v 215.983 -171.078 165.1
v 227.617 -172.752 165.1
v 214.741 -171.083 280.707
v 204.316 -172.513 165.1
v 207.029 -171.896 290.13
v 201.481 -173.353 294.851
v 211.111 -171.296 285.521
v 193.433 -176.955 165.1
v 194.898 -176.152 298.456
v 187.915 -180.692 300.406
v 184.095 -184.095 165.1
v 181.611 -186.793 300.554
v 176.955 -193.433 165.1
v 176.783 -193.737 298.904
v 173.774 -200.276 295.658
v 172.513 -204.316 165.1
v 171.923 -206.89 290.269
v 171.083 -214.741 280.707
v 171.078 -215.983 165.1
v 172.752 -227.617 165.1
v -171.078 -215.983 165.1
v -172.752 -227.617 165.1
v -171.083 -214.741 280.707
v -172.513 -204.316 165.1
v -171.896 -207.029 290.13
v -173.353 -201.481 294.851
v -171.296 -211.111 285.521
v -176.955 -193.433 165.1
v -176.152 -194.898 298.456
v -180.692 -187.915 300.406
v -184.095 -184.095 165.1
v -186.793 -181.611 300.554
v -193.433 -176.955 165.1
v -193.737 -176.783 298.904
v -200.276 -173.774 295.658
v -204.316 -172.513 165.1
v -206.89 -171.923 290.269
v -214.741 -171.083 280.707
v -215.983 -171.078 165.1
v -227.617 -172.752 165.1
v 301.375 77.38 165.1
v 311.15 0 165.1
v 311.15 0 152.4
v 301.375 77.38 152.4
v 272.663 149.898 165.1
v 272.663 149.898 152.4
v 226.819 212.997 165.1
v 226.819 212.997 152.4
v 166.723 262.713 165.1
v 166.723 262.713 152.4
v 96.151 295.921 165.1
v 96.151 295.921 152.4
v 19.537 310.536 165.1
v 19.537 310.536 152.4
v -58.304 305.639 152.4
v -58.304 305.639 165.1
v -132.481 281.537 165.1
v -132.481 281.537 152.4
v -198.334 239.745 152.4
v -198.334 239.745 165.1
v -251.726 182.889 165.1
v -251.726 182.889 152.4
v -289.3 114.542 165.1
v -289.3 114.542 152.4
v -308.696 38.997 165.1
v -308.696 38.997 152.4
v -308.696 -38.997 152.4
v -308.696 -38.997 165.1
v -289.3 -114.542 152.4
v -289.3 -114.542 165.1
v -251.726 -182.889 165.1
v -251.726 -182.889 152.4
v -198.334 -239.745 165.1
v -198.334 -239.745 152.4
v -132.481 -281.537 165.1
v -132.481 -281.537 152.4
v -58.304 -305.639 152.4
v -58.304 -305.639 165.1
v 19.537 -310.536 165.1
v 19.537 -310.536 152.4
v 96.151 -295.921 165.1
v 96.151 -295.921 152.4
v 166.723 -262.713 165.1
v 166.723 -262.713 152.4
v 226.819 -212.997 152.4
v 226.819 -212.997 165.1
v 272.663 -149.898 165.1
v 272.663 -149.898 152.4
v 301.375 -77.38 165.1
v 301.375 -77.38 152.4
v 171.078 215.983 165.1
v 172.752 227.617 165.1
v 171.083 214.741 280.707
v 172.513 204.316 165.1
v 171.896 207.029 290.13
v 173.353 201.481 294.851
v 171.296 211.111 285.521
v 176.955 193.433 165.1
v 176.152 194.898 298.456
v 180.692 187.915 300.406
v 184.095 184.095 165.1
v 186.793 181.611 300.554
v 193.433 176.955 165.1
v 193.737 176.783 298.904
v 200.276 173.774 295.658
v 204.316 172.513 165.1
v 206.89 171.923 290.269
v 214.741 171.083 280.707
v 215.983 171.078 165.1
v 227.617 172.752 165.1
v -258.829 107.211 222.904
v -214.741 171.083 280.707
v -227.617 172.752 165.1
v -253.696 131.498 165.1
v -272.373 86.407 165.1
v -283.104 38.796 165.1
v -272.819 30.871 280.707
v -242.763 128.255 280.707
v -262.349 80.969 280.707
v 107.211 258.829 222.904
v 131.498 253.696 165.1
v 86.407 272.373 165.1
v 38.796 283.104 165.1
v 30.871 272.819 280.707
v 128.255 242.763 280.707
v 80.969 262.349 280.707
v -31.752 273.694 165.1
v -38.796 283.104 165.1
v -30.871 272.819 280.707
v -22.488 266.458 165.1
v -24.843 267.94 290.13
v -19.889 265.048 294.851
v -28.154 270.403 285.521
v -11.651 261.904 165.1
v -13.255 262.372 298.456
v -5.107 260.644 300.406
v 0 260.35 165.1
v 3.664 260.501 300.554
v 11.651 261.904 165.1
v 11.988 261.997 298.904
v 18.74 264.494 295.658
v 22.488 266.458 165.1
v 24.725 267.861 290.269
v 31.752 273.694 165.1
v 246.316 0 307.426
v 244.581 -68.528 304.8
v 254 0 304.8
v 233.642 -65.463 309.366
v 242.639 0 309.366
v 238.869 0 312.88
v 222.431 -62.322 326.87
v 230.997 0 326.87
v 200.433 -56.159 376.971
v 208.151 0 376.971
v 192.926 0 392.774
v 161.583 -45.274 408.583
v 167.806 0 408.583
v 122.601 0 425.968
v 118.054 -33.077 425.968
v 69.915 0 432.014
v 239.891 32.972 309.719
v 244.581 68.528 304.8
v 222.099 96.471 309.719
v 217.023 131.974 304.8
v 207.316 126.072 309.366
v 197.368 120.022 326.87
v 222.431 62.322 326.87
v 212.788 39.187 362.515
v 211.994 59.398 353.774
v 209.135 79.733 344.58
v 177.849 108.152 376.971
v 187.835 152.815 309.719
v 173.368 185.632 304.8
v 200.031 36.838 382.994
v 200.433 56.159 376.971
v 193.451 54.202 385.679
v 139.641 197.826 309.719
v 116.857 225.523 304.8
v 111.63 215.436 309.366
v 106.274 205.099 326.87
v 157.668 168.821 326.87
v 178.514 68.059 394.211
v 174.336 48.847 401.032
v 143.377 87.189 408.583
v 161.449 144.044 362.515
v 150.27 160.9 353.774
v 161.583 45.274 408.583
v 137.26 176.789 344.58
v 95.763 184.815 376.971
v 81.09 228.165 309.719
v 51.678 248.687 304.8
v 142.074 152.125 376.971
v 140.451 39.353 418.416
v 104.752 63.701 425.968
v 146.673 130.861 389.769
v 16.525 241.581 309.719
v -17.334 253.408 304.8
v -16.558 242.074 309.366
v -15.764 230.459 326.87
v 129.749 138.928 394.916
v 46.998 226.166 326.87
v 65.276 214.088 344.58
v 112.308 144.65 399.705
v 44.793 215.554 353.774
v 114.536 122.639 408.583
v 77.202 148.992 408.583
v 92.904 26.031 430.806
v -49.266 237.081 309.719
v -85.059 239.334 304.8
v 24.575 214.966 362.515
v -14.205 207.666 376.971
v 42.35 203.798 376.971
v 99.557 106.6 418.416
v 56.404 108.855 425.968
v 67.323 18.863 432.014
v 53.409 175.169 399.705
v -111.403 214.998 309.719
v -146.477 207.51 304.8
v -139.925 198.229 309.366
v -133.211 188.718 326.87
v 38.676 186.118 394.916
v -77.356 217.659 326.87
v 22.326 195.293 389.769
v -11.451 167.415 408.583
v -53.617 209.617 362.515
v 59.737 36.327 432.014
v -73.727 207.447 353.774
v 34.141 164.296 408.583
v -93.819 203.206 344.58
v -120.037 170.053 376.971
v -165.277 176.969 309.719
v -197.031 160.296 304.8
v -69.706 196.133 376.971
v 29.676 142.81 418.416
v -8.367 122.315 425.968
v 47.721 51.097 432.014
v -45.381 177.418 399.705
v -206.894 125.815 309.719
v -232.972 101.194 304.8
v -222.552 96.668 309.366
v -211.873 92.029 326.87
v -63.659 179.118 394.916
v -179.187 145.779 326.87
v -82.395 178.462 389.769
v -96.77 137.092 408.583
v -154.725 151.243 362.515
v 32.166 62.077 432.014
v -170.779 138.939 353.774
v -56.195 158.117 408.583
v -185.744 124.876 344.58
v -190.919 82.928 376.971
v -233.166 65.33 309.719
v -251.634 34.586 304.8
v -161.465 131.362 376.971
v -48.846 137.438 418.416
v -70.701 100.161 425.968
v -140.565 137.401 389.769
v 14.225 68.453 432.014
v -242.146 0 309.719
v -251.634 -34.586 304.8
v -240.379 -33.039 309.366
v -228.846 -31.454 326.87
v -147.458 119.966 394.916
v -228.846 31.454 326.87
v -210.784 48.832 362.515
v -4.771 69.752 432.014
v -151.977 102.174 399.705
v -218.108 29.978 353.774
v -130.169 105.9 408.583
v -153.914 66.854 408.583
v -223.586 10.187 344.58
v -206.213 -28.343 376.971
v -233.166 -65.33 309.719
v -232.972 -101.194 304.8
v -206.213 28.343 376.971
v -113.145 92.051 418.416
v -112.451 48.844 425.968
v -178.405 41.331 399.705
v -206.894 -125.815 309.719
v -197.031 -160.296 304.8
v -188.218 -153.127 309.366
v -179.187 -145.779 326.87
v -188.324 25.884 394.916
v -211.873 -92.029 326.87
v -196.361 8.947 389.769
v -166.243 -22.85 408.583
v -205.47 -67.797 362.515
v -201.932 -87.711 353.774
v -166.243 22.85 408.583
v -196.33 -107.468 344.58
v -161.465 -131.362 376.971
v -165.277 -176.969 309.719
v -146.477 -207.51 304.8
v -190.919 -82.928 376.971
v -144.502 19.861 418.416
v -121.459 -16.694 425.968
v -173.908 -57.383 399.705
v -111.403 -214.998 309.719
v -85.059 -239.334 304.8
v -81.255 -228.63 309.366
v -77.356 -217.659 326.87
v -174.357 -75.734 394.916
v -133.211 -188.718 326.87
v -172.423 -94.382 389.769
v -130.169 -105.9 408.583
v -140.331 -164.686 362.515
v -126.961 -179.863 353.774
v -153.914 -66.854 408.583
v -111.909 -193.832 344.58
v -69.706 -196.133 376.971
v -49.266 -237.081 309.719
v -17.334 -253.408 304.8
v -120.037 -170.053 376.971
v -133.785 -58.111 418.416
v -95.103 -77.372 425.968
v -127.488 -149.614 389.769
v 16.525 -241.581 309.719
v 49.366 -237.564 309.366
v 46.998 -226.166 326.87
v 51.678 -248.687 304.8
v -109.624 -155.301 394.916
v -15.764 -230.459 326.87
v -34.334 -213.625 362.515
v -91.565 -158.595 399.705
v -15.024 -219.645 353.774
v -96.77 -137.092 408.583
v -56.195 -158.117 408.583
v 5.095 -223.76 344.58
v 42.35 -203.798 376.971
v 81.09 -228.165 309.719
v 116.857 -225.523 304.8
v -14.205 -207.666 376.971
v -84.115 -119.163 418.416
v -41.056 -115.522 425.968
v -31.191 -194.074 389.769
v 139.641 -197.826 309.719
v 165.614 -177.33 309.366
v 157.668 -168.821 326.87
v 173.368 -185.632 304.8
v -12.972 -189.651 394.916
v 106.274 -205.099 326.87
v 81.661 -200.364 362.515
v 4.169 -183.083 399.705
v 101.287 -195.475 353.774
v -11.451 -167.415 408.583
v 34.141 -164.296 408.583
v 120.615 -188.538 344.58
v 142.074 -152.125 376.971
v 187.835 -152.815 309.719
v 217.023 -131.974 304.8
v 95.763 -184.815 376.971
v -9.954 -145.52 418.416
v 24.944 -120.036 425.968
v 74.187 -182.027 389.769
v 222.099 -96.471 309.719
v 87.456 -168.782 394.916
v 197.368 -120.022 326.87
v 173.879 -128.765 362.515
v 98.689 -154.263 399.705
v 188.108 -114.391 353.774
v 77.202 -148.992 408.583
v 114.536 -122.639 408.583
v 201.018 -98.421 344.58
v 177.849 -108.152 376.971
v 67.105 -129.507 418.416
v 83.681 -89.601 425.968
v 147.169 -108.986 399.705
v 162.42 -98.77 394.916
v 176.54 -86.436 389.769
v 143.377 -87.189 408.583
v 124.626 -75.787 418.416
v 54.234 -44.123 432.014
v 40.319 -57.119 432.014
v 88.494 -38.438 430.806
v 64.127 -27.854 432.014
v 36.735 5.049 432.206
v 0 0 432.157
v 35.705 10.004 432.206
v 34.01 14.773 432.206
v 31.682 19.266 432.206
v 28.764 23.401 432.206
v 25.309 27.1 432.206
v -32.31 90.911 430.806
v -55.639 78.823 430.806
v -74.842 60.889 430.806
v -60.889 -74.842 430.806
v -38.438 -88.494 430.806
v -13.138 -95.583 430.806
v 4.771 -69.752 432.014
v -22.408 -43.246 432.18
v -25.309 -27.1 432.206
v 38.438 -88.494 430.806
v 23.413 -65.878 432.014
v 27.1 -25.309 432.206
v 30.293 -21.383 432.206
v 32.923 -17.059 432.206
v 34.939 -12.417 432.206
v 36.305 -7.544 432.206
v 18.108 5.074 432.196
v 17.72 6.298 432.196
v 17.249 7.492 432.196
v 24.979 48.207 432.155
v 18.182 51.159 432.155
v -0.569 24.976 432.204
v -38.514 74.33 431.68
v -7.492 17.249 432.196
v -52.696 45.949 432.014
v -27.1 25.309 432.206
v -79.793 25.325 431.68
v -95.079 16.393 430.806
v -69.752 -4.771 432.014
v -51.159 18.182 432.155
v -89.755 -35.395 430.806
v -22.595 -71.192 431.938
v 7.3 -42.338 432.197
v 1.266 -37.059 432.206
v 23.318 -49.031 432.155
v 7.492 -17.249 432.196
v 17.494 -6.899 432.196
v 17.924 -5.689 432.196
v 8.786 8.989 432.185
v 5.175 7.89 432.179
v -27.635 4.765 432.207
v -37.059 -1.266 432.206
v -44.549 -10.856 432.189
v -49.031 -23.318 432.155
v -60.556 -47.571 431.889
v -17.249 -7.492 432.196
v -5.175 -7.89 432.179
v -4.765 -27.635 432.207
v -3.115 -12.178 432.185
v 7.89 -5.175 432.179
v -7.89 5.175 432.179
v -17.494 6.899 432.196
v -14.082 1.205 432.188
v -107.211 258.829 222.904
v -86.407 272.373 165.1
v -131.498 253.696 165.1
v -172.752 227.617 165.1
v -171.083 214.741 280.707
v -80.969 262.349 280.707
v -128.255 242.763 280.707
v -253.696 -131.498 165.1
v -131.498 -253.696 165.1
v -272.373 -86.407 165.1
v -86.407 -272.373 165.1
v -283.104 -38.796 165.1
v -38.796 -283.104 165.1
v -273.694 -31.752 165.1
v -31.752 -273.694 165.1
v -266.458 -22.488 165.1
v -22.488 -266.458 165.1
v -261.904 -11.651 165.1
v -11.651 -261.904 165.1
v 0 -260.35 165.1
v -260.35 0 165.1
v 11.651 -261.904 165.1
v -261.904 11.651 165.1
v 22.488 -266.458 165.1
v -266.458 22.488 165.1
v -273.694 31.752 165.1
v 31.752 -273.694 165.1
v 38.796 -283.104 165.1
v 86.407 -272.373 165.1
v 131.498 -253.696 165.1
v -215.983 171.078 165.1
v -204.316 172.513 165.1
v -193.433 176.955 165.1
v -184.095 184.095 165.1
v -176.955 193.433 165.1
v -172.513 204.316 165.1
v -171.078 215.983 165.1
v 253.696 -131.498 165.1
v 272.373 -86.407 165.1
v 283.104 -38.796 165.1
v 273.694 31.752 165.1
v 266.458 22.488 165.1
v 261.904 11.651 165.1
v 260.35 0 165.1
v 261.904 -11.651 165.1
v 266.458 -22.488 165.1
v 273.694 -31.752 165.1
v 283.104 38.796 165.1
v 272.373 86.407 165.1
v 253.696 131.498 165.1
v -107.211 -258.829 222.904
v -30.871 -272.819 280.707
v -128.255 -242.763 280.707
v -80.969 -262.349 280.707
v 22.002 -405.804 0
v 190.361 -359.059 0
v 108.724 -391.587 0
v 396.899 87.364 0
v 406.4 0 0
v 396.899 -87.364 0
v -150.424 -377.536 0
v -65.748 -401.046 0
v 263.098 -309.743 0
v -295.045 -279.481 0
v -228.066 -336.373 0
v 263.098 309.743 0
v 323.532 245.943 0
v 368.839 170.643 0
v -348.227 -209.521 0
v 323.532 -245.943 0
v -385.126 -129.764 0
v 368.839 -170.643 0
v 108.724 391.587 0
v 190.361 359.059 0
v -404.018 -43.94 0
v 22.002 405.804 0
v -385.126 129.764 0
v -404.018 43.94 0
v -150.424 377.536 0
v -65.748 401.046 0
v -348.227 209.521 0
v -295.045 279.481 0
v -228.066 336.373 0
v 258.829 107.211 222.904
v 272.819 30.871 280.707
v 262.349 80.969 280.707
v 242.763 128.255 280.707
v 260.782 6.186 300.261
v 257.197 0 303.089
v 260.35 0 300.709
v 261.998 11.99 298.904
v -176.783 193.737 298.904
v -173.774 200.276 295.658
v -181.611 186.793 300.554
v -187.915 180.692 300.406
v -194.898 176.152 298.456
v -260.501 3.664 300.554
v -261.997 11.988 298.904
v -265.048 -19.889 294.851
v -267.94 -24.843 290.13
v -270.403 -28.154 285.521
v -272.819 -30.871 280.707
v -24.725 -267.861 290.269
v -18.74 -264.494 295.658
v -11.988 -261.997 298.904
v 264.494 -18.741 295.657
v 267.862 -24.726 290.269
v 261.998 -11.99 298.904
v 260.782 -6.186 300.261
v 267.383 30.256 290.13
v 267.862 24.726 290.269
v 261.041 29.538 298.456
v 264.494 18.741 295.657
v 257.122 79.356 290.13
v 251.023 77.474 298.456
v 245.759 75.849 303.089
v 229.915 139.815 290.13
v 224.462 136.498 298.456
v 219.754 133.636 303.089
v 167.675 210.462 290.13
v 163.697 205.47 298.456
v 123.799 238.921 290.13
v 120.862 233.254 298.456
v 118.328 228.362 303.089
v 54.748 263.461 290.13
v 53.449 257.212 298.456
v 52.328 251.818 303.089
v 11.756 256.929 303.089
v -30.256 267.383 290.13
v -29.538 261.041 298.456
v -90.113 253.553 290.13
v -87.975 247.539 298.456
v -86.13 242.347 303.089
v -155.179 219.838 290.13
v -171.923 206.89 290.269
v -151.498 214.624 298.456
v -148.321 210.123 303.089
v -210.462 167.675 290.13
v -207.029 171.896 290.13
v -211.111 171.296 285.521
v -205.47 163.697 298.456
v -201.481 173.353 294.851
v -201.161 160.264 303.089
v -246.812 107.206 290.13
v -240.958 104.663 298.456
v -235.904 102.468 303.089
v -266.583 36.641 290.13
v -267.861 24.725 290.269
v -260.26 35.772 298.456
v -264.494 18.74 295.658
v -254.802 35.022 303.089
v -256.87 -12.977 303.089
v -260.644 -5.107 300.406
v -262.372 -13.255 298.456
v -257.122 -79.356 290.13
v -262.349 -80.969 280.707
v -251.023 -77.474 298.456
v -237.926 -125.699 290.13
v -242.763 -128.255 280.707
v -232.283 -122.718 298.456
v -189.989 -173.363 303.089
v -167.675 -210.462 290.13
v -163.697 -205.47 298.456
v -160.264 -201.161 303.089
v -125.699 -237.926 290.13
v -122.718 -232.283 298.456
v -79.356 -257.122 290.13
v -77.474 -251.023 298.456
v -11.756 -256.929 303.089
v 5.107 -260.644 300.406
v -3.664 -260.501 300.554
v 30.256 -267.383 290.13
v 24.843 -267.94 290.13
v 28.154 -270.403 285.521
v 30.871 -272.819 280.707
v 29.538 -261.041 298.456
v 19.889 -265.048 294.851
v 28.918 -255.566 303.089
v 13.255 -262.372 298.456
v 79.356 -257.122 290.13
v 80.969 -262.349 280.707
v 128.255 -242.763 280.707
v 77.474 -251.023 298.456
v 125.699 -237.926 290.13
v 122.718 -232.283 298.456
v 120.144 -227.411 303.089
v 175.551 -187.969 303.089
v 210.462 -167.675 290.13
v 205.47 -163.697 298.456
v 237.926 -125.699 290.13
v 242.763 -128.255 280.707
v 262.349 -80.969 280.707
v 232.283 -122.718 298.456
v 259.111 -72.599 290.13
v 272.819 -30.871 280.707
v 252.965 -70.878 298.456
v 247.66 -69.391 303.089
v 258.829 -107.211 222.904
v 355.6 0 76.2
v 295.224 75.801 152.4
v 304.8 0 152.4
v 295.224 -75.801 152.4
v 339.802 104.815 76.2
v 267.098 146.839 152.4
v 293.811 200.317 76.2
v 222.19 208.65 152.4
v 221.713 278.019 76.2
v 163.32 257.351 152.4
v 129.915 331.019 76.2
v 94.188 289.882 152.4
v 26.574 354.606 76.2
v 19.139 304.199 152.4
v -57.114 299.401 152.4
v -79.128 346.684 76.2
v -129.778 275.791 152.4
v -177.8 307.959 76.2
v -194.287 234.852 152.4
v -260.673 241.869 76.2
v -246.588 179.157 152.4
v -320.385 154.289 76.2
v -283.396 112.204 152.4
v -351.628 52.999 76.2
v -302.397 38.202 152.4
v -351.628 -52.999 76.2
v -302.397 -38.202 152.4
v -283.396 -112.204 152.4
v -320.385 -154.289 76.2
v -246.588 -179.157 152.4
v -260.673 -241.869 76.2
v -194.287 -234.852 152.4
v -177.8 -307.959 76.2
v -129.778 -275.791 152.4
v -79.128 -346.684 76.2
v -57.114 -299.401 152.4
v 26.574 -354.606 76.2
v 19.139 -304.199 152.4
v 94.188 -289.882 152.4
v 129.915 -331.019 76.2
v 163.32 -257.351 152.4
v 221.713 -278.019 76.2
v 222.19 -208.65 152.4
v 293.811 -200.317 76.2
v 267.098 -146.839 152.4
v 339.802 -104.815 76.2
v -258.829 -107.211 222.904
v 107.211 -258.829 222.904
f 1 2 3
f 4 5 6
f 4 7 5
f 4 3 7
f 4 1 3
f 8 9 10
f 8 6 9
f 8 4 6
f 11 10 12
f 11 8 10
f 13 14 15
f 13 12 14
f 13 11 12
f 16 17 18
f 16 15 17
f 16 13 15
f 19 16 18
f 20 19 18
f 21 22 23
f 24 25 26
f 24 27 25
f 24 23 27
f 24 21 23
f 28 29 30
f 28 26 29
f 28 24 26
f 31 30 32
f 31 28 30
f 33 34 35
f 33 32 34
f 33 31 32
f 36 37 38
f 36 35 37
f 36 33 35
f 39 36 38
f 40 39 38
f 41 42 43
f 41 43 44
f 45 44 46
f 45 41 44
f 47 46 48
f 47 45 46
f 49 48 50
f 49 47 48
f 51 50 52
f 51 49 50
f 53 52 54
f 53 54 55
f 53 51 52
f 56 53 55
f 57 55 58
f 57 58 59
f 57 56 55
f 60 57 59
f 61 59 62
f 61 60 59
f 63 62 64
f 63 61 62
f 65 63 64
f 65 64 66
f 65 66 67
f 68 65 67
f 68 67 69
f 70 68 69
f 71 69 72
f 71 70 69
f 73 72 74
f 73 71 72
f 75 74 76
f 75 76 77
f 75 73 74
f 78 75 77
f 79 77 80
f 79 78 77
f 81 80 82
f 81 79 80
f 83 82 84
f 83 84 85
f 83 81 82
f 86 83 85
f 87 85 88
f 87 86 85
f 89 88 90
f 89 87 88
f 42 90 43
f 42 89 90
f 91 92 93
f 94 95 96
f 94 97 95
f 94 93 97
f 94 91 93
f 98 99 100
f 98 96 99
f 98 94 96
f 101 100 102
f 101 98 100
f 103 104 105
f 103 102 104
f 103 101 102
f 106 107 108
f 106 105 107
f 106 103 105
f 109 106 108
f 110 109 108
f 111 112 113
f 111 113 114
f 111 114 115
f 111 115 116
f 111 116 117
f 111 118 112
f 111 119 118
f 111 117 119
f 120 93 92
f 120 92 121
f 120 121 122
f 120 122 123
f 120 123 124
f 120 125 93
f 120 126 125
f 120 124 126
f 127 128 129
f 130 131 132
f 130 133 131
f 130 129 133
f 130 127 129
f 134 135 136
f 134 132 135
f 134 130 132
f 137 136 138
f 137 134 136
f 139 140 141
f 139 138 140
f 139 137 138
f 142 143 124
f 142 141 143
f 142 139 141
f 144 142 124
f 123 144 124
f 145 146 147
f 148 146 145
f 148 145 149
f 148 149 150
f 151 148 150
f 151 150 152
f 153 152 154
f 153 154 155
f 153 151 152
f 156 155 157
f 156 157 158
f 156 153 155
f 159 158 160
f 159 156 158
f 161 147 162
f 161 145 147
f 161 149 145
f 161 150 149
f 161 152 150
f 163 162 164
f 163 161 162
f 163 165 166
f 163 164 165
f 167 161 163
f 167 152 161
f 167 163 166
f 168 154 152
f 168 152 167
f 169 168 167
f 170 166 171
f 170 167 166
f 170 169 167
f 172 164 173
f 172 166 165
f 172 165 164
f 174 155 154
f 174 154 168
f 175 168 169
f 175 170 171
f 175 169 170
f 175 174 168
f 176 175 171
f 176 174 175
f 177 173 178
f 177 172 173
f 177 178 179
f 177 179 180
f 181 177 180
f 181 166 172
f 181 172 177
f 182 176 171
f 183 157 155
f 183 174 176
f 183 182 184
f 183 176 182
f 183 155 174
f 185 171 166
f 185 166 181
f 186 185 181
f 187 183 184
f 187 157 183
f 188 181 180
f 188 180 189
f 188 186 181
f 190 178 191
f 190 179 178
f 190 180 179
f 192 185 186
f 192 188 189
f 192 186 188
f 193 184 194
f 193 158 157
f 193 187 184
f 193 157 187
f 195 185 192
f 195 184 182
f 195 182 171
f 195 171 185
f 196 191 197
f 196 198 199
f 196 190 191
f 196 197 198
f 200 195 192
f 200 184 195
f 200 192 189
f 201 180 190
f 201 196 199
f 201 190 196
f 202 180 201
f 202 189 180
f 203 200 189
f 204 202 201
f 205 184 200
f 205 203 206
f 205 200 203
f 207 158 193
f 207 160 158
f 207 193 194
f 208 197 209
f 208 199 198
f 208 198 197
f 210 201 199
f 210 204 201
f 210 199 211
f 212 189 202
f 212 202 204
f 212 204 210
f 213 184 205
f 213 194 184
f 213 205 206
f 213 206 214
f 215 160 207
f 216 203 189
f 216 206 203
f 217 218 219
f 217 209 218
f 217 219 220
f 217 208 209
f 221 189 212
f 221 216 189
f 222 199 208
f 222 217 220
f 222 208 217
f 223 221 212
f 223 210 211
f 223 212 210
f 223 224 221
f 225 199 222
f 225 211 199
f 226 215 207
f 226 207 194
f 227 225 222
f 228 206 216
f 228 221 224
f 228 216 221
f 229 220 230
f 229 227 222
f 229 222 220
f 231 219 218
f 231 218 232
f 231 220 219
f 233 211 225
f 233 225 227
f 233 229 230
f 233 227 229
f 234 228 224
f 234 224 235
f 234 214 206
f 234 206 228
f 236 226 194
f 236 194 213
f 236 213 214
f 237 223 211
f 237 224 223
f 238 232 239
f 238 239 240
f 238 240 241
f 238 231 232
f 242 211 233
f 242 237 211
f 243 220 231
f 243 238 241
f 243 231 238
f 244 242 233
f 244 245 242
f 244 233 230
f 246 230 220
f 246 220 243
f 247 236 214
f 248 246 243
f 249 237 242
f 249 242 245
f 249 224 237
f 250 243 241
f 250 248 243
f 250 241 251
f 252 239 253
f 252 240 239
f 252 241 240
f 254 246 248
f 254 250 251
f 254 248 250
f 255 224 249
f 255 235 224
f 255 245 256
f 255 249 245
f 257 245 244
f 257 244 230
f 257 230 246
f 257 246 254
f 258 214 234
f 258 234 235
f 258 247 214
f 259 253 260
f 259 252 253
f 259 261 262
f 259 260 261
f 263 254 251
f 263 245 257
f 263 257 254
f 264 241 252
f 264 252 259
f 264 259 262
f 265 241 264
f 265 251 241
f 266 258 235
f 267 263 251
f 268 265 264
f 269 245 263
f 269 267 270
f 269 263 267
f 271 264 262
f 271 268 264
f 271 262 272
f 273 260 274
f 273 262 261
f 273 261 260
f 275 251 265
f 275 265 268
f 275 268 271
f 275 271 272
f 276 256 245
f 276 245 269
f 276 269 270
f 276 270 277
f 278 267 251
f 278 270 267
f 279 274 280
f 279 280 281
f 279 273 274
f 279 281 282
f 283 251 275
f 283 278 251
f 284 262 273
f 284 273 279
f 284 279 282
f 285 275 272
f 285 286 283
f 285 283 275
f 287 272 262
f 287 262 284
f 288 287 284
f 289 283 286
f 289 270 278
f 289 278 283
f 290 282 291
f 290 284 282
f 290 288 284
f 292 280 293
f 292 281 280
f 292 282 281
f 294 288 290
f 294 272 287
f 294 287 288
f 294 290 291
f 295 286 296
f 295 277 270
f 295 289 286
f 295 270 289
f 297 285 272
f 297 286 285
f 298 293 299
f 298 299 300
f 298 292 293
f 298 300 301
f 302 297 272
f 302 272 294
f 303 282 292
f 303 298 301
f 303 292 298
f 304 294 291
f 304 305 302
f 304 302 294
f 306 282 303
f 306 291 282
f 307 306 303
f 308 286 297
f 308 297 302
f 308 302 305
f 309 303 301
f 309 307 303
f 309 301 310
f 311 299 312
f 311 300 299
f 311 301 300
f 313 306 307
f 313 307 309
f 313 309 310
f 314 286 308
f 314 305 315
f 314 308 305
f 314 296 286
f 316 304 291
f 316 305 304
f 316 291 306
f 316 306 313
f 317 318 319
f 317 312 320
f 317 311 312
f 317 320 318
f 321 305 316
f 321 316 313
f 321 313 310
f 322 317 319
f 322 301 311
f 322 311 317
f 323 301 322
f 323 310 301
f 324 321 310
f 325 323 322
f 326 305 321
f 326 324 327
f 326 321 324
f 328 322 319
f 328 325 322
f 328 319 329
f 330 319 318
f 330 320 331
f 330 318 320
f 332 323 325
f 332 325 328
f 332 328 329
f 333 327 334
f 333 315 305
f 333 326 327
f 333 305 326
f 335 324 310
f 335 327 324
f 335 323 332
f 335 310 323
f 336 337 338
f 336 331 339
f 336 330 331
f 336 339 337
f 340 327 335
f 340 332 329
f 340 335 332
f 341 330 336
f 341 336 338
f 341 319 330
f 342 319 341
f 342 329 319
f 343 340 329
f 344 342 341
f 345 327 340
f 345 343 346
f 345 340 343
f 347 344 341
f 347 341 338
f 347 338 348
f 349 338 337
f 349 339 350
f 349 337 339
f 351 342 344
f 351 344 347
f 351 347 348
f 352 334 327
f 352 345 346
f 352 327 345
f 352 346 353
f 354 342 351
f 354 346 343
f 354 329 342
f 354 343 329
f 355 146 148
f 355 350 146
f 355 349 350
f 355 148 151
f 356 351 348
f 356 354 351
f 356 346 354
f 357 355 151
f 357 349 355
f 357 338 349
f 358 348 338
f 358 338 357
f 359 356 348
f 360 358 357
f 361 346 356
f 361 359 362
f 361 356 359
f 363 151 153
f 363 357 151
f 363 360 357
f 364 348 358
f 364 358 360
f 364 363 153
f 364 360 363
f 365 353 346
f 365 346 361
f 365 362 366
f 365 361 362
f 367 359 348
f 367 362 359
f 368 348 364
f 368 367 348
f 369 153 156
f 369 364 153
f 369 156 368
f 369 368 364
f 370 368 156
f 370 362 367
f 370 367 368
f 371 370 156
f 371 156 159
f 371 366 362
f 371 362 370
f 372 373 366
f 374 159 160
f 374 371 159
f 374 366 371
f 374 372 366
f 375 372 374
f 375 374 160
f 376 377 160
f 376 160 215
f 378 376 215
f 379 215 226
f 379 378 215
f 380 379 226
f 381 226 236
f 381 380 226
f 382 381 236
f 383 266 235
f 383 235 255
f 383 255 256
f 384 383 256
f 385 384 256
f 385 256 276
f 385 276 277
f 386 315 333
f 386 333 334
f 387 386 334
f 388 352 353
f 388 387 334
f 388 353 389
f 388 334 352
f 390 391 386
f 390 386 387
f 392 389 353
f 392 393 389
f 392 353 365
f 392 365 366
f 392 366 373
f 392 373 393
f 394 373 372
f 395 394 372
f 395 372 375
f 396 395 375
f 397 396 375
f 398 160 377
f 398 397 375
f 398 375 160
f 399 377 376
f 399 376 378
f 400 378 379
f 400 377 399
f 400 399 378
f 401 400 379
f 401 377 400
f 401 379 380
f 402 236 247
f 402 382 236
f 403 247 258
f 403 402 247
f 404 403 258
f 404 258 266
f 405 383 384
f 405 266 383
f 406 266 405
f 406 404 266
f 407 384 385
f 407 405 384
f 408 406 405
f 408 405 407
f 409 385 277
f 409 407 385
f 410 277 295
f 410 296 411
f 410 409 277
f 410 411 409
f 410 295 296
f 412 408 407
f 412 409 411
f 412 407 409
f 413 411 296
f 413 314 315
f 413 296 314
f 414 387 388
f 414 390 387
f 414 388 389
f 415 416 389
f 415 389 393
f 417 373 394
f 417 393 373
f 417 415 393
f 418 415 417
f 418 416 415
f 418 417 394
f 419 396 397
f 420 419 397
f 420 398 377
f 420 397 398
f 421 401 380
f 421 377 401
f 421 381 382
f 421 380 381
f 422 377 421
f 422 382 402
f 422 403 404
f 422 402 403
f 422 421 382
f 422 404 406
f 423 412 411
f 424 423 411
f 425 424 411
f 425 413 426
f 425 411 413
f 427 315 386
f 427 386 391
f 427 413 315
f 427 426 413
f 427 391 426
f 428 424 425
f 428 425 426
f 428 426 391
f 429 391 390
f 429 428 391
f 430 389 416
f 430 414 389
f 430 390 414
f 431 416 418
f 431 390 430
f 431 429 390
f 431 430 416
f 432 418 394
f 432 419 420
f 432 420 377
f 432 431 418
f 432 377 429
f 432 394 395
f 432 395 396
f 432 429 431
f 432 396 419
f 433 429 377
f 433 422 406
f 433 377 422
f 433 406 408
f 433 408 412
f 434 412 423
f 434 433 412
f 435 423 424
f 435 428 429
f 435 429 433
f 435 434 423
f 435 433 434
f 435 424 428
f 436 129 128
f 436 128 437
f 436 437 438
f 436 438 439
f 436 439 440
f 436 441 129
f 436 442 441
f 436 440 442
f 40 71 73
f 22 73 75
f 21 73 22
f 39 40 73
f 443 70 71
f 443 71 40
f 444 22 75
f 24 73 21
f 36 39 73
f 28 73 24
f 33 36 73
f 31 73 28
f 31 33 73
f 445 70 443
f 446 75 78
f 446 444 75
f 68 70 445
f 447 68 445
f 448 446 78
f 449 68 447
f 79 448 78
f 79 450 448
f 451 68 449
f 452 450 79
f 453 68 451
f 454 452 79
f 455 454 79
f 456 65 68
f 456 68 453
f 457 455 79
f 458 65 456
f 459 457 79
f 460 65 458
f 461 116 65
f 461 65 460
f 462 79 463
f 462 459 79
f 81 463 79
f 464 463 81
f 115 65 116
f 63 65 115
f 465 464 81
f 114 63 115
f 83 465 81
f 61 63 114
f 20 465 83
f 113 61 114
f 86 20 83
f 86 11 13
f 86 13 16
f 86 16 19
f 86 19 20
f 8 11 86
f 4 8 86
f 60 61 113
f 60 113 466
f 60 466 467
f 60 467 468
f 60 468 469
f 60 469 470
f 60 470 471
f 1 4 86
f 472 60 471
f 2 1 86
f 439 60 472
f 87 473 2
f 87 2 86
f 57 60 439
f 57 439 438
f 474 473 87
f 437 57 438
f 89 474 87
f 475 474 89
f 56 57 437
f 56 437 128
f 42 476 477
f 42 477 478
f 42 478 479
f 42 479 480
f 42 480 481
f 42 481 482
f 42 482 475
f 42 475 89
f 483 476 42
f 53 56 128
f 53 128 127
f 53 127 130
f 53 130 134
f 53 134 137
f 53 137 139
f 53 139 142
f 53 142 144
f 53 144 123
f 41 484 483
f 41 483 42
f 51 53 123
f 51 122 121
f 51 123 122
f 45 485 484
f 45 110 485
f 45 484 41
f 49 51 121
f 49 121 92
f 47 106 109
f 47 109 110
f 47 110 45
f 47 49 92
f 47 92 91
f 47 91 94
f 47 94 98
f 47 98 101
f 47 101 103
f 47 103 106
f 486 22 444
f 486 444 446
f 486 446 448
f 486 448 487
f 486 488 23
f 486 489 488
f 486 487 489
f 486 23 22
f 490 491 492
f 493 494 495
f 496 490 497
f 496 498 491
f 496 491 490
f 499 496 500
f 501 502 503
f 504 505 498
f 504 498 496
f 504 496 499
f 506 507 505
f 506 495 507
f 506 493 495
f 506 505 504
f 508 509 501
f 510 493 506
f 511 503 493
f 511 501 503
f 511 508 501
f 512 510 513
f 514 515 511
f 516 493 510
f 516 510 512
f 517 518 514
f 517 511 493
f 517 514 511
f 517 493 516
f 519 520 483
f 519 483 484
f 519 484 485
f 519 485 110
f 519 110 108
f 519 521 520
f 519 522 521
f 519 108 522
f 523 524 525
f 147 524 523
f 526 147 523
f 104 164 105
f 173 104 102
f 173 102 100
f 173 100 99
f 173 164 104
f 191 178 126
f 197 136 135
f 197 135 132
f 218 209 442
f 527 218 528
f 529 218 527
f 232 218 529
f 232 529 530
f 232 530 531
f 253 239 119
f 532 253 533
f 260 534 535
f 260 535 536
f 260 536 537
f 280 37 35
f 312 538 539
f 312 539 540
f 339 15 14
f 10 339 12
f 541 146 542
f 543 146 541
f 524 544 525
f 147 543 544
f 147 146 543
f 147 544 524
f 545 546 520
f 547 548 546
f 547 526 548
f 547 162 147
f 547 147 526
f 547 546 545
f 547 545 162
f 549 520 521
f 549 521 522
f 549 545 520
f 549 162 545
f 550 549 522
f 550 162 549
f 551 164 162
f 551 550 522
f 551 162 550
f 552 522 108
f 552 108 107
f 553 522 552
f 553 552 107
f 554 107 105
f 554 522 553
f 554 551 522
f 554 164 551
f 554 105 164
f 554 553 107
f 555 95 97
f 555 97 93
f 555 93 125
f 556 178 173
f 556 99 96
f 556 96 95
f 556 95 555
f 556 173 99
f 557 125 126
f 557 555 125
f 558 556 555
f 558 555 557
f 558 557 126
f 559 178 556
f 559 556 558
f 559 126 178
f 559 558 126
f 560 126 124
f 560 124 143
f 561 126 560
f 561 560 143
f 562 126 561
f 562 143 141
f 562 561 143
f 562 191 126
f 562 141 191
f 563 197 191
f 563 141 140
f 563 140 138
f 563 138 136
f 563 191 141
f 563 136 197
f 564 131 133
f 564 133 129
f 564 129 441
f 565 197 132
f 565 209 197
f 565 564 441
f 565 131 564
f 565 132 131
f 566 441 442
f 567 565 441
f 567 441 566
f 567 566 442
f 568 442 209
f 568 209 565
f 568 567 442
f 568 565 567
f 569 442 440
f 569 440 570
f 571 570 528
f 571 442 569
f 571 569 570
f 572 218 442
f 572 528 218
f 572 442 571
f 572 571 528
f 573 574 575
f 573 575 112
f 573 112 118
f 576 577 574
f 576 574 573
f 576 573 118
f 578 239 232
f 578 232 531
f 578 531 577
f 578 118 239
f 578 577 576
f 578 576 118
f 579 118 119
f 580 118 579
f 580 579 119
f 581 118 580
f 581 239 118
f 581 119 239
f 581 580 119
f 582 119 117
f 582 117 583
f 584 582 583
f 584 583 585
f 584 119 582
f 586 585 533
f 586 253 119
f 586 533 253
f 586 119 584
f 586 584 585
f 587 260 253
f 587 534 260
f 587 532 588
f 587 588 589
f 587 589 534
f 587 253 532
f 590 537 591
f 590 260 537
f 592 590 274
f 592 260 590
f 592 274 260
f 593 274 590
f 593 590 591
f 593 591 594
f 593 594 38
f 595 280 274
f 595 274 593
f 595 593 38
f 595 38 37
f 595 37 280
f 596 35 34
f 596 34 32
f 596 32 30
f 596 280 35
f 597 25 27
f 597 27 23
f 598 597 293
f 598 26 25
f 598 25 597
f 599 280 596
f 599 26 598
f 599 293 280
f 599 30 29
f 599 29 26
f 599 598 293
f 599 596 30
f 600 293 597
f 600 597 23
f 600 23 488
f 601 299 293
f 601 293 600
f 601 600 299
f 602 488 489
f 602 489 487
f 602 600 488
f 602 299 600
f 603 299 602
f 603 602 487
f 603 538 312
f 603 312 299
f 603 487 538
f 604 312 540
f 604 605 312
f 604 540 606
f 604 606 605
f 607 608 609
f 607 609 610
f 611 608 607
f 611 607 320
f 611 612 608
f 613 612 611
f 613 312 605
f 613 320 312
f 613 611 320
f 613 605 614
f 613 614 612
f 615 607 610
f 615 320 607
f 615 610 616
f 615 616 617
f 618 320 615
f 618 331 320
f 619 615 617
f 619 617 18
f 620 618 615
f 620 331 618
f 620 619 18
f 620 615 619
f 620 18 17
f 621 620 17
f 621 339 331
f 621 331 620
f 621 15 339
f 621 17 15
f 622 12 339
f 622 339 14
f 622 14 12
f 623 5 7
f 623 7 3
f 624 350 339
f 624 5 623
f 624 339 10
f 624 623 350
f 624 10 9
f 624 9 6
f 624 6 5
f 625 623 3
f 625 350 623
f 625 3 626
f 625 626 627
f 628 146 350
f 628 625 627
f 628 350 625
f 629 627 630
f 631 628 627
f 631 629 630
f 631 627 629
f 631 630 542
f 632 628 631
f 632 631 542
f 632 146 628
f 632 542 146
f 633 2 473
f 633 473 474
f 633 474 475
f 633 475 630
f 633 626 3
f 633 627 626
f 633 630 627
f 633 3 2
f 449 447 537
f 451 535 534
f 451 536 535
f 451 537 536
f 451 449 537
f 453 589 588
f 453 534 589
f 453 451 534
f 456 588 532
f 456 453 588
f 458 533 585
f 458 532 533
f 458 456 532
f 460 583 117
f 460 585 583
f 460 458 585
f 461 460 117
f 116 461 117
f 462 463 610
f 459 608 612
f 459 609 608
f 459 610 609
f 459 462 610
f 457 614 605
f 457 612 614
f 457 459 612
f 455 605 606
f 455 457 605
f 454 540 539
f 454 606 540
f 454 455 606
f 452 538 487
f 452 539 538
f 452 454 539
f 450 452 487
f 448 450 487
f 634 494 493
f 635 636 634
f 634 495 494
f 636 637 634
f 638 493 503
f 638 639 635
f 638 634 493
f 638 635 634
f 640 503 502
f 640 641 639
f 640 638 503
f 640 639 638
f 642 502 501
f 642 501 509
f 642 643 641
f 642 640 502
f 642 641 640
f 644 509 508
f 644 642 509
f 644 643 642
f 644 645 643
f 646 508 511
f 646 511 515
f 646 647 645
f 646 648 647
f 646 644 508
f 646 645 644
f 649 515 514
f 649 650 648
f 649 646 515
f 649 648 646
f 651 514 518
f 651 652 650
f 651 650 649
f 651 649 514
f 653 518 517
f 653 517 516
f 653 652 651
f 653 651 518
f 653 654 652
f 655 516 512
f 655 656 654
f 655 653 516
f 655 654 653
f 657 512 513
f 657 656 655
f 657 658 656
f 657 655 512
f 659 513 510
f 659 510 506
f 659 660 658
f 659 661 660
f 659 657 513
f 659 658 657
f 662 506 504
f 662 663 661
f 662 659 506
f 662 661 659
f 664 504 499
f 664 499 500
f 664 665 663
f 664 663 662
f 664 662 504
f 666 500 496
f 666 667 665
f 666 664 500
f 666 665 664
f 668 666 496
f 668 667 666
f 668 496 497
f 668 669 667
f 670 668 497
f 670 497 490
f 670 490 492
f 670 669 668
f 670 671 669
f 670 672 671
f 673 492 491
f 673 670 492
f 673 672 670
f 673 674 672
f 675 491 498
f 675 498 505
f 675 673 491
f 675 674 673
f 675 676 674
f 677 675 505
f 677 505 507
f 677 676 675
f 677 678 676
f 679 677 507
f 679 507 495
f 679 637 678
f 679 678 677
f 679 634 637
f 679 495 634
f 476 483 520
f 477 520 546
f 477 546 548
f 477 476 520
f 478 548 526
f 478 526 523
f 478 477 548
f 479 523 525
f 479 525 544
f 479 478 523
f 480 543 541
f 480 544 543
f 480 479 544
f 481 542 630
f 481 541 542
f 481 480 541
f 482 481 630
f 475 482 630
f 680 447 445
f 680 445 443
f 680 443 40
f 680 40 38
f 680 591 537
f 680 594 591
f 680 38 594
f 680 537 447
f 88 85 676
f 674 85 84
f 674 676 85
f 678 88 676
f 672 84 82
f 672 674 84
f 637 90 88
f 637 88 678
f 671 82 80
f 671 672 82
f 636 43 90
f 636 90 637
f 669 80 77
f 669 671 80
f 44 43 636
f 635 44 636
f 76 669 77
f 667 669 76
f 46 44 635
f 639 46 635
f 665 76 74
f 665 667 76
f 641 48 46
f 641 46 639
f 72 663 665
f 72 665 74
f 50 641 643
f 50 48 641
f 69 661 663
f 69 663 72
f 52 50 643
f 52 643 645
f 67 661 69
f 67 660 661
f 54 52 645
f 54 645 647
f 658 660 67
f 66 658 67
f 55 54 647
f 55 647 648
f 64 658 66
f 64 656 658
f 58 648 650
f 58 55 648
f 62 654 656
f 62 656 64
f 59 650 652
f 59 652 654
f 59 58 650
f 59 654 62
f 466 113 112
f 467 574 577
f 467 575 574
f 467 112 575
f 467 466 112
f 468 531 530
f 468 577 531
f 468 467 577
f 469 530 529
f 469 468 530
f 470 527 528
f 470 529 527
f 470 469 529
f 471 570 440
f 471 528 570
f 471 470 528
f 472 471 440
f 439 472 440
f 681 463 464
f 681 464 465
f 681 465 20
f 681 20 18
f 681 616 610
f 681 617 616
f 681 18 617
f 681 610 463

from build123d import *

# Parameters (mm, degrees)
F2_R     = 44.45
F3_DEPTH = 152.4


with BuildPart() as f1:
    # F0 (on Front) → F1 (revolve)
    with BuildSketch(Plane.XZ):
        Polygon((0, 152.4), (0, 0), (406.4, 0), (304.8, 152.4), align=None)
        with BuildLine():
            Line((0, 304.8), (0, 152.4))
            Line((0, 152.4), (304.8, 152.4))
            Line((304.8, 152.4), (311.15, 152.4))
            Line((311.15, 152.4), (311.15, 165.1))
            Line((311.15, 165.1), (285.75, 165.1))
            Line((285.75, 165.1), (274.5597064495, 280.7071506977))
            add(Edge.make_bspline(
                [(274.5597064495, 280.7071506977), (271.7412931371, 285.8037865906), (266.3064654877, 295.6317765268), (258.3550352472, 302.9362996616), (254, 304.8)],
                knots=[0, 0, 0, 0, 0.0771596923, 0.1487892593, 0.1487892593, 0.1487892593, 0.1487892593], degree=3))
            Line((254, 304.8), (0, 304.8))
        make_face()
        with BuildLine():
            Line((0, 432.1574568748), (0, 304.8))
            Line((0, 304.8), (254, 304.8))
            add(Edge.make_bspline(
                [(254, 304.8), (249.5133226892, 306.7200354412), (234.5546852881, 307.2114964849), (217.4700462275, 371.4836376253), (189.2452236448, 397.5288625798), (151.6517387873, 417.6984471616), (107.5702368284, 431.0904789048), (68.3418151338, 432.3167053391), (24.8362806494, 432.2153297824), (0, 432.1574568748)],
                knots=[0.1487892593, 0.1487892593, 0.1487892593, 0.1487892593, 0.222584013, 0.3675456115, 0.4848887913, 0.6047642941, 0.729359126, 0.8454975262, 1, 1, 1, 1], degree=3))
        make_face()
    revolve(axis=Axis((0, 0, 228.6), (0, 0, 1)))

    # F2 (on face) → F3 (cut)
    with BuildSketch(Plane.XY.offset(165.1)):
        with Locations((0, 304.8)):
            Circle(F2_R)
        with Locations((-215.5261469057, 215.5261469057)):
            Circle(F2_R)
        with Locations((-304.8, 0)):
            Circle(F2_R)
        with Locations((-215.5261469057, -215.5261469057)):
            Circle(F2_R)
        with Locations((0, -304.8)):
            Circle(F2_R)
        with Locations((215.5261469057, -215.5261469057)):
            Circle(F2_R)
        with Locations((304.8, 0)):
            Circle(F2_R)
        with Locations((215.5261469057, 215.5261469057)):
            Circle(F2_R)
    extrude(amount=F3_DEPTH, mode=Mode.SUBTRACT)


solid = f1.part
